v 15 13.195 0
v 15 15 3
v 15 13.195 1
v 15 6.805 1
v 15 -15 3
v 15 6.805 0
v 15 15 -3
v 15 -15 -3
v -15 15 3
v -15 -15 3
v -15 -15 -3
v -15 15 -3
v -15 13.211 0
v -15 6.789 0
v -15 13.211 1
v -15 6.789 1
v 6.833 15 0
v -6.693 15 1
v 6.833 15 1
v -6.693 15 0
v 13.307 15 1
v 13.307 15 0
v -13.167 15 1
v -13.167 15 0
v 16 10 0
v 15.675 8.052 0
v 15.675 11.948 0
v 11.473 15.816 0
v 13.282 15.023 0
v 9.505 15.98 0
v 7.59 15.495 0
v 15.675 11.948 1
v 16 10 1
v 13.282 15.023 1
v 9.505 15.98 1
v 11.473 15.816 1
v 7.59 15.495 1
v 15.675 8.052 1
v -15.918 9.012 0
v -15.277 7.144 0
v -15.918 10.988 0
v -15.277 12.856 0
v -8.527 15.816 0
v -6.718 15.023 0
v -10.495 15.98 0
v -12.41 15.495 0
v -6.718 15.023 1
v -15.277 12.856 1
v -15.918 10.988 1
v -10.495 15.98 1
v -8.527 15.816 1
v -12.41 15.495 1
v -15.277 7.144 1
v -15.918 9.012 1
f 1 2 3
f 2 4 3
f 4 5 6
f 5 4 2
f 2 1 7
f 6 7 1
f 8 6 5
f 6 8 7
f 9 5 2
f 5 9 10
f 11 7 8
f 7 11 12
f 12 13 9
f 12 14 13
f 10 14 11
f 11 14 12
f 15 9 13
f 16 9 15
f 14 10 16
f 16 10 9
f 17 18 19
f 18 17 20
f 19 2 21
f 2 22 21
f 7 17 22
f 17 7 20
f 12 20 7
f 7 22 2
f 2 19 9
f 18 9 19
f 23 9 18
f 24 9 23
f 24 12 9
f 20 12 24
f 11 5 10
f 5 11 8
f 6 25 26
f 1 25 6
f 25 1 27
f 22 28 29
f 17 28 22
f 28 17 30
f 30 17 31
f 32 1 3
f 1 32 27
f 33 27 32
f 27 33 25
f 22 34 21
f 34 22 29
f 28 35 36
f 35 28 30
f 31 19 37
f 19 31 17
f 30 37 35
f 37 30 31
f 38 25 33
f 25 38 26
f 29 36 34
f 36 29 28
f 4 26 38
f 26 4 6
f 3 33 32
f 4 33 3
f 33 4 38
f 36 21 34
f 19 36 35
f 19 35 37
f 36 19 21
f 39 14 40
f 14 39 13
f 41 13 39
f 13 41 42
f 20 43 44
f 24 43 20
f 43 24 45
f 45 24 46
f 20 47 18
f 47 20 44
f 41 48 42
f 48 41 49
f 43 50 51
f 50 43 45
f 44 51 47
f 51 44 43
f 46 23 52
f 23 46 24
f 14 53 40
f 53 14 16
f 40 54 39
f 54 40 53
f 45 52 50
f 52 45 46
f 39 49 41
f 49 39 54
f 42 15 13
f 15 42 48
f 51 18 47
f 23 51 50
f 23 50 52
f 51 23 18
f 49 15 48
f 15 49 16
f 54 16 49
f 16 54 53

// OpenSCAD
holer=2;
thick=6;

function half(n) = n/2;

module hole(x,y) {
// try this
// holer=20;
    translate([x,y,0]) cylinder(r=holer,height=thick);
}

cube([30,30,thick],center=true);
hole(10,half(20));
// this will override holer=2 above
// for both calls to hole
holer=6;
hole(-10,half(20));
